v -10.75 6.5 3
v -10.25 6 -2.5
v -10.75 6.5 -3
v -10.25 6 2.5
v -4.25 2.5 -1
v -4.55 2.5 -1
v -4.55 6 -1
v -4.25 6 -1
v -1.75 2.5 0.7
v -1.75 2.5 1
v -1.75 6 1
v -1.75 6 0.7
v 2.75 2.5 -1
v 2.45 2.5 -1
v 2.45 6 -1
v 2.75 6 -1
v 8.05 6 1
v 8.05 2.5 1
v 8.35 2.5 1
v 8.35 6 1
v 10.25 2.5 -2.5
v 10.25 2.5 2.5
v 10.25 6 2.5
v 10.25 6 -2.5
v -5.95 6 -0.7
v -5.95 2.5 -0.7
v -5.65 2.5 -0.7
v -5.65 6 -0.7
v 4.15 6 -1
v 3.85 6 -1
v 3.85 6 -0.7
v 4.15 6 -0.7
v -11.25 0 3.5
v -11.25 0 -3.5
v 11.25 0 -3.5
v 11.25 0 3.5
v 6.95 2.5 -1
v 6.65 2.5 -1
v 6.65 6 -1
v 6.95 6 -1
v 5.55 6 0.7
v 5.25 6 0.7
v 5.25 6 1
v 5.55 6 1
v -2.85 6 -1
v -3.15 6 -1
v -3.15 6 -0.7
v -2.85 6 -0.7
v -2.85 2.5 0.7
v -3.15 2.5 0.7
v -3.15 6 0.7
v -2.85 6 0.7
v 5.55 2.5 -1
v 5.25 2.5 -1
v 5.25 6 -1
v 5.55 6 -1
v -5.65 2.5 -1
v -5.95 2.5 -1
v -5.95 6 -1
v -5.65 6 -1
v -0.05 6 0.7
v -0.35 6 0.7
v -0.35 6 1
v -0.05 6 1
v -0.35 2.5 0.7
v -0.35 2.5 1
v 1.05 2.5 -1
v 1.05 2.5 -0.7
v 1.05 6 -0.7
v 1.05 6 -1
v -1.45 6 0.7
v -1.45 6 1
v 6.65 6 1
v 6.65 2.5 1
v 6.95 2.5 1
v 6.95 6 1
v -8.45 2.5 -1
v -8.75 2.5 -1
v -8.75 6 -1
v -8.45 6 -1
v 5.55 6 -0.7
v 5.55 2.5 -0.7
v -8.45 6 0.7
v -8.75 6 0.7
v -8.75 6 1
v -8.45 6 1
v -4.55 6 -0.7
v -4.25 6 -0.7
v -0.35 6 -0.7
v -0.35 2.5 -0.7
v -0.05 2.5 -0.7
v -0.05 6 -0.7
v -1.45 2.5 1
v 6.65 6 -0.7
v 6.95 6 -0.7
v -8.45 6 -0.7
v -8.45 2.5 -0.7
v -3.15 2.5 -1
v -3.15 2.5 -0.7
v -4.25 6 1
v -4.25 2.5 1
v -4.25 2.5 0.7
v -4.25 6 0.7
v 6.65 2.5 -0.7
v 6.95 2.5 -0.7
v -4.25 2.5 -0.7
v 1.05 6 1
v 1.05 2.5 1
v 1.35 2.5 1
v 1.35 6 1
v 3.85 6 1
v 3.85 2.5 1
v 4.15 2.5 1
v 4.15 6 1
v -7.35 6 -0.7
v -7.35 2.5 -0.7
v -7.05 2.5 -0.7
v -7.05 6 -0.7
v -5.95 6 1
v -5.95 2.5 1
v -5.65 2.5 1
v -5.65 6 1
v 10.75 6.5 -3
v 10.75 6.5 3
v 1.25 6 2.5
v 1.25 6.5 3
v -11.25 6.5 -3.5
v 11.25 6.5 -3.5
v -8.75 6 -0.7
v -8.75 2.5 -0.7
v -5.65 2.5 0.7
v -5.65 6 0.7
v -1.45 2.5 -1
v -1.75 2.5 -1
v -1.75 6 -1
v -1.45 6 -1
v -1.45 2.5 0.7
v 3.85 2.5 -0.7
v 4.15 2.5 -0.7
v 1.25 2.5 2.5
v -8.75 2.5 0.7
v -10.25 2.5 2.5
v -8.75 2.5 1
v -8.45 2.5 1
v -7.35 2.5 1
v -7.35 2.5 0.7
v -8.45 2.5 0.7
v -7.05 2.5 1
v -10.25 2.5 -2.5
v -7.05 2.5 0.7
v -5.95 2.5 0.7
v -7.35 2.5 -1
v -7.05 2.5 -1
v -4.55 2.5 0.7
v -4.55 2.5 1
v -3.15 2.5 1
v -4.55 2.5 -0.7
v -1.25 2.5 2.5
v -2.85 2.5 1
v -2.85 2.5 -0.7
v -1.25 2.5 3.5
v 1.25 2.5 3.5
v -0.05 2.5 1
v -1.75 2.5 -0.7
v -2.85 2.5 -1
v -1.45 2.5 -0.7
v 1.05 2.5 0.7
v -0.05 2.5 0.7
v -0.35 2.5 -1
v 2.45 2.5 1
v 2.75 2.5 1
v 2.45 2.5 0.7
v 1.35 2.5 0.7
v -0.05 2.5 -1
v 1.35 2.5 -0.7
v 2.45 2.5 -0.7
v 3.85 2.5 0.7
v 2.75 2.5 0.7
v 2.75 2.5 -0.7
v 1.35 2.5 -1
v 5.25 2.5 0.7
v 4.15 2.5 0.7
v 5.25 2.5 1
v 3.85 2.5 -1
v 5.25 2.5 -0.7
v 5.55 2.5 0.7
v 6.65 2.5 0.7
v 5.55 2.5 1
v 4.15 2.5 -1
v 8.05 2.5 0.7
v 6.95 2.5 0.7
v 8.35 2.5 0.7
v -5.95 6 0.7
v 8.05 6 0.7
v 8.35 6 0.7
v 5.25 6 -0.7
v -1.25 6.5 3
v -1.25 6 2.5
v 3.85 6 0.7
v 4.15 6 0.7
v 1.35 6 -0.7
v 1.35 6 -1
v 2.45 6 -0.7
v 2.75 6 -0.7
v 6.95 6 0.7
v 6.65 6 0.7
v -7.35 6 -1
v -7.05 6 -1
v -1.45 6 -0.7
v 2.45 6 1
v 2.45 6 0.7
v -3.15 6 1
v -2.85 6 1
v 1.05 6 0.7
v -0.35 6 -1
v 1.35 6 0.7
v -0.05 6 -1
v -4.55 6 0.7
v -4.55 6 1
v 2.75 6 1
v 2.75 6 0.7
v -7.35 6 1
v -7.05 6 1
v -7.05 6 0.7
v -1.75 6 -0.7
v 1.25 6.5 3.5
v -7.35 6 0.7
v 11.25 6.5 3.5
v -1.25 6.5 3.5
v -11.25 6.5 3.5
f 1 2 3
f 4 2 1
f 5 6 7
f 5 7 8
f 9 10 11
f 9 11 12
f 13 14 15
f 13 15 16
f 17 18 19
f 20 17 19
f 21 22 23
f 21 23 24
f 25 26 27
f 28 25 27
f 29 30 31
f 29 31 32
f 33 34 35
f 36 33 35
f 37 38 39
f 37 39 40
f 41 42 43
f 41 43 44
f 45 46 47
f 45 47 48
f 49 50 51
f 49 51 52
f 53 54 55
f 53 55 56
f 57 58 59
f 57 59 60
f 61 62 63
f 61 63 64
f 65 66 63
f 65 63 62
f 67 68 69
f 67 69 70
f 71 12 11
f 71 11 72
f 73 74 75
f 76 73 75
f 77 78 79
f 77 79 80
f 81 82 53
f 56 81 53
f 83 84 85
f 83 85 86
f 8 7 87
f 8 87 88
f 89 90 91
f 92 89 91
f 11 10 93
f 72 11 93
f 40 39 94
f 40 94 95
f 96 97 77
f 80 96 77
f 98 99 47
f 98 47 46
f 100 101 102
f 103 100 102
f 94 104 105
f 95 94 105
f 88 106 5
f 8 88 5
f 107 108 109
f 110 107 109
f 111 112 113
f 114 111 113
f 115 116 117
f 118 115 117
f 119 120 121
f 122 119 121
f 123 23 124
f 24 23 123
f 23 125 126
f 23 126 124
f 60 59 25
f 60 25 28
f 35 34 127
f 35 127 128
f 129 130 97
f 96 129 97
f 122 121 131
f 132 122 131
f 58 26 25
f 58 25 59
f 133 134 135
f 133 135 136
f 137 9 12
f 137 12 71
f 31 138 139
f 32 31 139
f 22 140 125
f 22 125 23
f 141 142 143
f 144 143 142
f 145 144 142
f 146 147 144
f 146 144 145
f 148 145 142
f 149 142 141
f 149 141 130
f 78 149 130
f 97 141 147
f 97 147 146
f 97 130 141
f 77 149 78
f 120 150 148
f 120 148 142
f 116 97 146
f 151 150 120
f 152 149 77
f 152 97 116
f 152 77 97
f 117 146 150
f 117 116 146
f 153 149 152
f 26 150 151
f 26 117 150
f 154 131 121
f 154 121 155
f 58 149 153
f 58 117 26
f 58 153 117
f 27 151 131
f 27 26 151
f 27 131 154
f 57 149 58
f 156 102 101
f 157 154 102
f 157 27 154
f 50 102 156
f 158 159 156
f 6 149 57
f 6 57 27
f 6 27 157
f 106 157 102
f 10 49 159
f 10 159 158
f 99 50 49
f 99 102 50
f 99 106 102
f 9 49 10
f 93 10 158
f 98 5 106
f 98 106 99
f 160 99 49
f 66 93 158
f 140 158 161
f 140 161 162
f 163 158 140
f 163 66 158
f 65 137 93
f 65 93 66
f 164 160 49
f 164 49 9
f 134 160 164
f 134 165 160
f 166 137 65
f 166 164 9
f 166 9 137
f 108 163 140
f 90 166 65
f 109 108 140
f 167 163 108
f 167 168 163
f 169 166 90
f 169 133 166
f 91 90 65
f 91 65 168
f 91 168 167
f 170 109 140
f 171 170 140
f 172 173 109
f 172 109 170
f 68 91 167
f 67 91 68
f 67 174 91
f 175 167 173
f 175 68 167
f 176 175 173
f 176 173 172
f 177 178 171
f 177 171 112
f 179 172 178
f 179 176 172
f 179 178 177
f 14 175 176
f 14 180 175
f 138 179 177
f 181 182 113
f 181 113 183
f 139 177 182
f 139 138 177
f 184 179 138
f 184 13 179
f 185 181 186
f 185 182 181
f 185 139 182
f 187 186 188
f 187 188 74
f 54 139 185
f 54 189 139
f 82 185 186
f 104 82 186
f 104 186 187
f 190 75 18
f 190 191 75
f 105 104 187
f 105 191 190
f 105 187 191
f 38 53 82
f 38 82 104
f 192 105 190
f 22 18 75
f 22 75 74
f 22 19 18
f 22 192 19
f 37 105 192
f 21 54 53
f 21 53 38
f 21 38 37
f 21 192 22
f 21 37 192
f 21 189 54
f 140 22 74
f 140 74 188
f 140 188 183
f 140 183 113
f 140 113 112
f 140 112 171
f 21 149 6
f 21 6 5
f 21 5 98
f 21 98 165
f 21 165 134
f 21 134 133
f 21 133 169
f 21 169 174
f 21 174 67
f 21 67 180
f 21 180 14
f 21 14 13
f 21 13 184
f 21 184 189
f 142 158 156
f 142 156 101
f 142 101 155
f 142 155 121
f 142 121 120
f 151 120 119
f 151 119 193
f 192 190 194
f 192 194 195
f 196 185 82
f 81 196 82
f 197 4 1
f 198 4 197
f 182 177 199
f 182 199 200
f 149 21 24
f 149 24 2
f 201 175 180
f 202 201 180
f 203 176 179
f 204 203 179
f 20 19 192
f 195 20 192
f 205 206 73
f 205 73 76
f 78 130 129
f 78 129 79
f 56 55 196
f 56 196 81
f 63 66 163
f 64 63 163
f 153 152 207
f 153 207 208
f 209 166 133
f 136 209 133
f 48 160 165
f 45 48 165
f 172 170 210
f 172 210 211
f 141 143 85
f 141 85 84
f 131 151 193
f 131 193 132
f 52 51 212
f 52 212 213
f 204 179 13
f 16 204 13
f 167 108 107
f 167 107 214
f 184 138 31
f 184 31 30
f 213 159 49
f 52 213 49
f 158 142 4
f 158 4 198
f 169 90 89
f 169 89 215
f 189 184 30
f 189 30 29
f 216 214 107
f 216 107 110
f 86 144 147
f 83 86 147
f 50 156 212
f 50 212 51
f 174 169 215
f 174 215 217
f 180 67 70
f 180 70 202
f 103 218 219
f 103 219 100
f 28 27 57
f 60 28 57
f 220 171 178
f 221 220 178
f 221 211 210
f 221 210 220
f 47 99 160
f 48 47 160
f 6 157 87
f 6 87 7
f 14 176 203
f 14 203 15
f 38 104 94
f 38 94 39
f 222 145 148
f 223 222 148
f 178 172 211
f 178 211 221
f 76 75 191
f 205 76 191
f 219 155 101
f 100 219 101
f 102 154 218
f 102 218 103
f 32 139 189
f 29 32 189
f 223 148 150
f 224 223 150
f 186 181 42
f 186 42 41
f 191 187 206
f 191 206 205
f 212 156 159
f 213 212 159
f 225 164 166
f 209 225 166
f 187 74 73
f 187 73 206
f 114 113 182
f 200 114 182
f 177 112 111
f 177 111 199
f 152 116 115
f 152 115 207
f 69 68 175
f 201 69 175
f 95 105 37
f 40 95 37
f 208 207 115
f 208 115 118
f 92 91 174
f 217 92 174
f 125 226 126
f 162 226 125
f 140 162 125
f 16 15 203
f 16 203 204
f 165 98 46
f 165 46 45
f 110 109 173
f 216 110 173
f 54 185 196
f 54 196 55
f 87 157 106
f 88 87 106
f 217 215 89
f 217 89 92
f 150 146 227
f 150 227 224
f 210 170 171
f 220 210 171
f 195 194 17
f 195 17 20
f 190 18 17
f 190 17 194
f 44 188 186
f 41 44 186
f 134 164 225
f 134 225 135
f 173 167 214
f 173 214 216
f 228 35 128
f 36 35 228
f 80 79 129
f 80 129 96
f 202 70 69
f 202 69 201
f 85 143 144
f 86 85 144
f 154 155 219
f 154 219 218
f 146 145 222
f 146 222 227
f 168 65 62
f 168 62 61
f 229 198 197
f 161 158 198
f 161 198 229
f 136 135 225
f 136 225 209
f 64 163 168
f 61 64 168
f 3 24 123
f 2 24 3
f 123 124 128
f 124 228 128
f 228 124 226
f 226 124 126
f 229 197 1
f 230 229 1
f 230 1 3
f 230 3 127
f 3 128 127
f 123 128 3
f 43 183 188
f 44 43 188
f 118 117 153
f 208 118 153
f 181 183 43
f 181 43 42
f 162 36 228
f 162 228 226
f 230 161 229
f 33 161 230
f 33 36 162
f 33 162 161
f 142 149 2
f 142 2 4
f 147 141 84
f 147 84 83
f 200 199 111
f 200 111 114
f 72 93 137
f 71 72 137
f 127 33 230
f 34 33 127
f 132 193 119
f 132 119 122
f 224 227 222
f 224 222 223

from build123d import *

# Parameters (mm, degrees)
SKETCH1_W           = 22.5
SKETCH1_H           = 7
BASE_DEPTH          = 2.5
RIMS_DEPTH          = 4
CHAMFER1_SIZE       = 0.5
SKETCH3_W           = 0.3
SKETCH3_H           = 0.3
BOSS_EXTRUDE3_DEPTH = 3.5


with BuildPart() as part:
    # Sketch1 → Base (new body)
    with BuildSketch(Plane(origin=(0, 0, 0), x_dir=(1, 0, 0), z_dir=(0, 1, 0))):
        Rectangle(SKETCH1_W, SKETCH1_H)
    extrude(amount=BASE_DEPTH)

    # Sketch2 → rims (add)
    with BuildSketch(Plane(origin=(0, 2.5, 0), x_dir=(1, 0, 0), z_dir=(0, 1, 0))):
        Polygon((-1.25, -2.5), (-1.25, -3.5), (-11.25, -3.5), (-11.25, 3.5), (11.25, 3.5), (11.25, -3.5), (1.25, -3.5), (1.25, -2.5), (10.25, -2.5), (10.25, 2.5), (-10.25, 2.5), (-10.25, -2.5), align=None)
    extrude(amount=RIMS_DEPTH)

    # Chamfer1
    chamfer1_edges = [part.edges().sort_by_distance(p)[0] for p in [
        (-5.75, 6.5, 2.5),
        (-10.25, 6.5, 0),
        (0, 6.5, -2.5),
        (10.25, 6.5, 0),
        (5.75, 6.5, 2.5),
    ]]
    chamfer(chamfer1_edges, length=CHAMFER1_SIZE)

    # Sketch3 → Boss-Extrude3 (add)
    with BuildSketch(Plane(origin=(0, 2.5, 0), x_dir=(1, 0, 0), z_dir=(0, 1, 0))):
        with Locations((-8.6, -0.85)):
            Rectangle(SKETCH3_W, SKETCH3_H)
        with Locations((-8.6, 0.85)):
            Rectangle(SKETCH3_W, SKETCH3_H)
        with Locations((-7.2, -0.85)):
            Rectangle(SKETCH3_W, SKETCH3_H)
        with Locations((-5.8, -0.85)):
            Rectangle(SKETCH3_W, SKETCH3_H)
        with Locations((-4.4, -0.85)):
            Rectangle(SKETCH3_W, SKETCH3_H)
        with Locations((-3, -0.85)):
            Rectangle(SKETCH3_W, SKETCH3_H)
        with Locations((-1.6, -0.85)):
            Rectangle(SKETCH3_W, SKETCH3_H)
        with Locations((-0.2, -0.85)):
            Rectangle(SKETCH3_W, SKETCH3_H)
        with Locations((1.2, -0.85)):
            Rectangle(SKETCH3_W, SKETCH3_H)
        with Locations((2.6, -0.85)):
            Rectangle(SKETCH3_W, SKETCH3_H)
        with Locations((4, -0.85)):
            Rectangle(SKETCH3_W, SKETCH3_H)
        with Locations((5.4, -0.85)):
            Rectangle(SKETCH3_W, SKETCH3_H)
        with Locations((6.8, -0.85)):
            Rectangle(SKETCH3_W, SKETCH3_H)
        with Locations((8.2, -0.85)):
            Rectangle(SKETCH3_W, SKETCH3_H)
        with Locations((-7.2, 0.85)):
            Rectangle(SKETCH3_W, SKETCH3_H)
        with Locations((-5.8, 0.85)):
            Rectangle(SKETCH3_W, SKETCH3_H)
        with Locations((-4.4, 0.85)):
            Rectangle(SKETCH3_W, SKETCH3_H)
        with Locations((-3, 0.85)):
            Rectangle(SKETCH3_W, SKETCH3_H)
        with Locations((-1.6, 0.85)):
            Rectangle(SKETCH3_W, SKETCH3_H)
        with Locations((-0.2, 0.85)):
            Rectangle(SKETCH3_W, SKETCH3_H)
        with Locations((1.2, 0.85)):
            Rectangle(SKETCH3_W, SKETCH3_H)
        with Locations((2.6, 0.85)):
            Rectangle(SKETCH3_W, SKETCH3_H)
        with Locations((4, 0.85)):
            Rectangle(SKETCH3_W, SKETCH3_H)
        with Locations((5.4, 0.85)):
            Rectangle(SKETCH3_W, SKETCH3_H)
        with Locations((6.8, 0.85)):
            Rectangle(SKETCH3_W, SKETCH3_H)
    extrude(amount=BOSS_EXTRUDE3_DEPTH)


solid = part.part
